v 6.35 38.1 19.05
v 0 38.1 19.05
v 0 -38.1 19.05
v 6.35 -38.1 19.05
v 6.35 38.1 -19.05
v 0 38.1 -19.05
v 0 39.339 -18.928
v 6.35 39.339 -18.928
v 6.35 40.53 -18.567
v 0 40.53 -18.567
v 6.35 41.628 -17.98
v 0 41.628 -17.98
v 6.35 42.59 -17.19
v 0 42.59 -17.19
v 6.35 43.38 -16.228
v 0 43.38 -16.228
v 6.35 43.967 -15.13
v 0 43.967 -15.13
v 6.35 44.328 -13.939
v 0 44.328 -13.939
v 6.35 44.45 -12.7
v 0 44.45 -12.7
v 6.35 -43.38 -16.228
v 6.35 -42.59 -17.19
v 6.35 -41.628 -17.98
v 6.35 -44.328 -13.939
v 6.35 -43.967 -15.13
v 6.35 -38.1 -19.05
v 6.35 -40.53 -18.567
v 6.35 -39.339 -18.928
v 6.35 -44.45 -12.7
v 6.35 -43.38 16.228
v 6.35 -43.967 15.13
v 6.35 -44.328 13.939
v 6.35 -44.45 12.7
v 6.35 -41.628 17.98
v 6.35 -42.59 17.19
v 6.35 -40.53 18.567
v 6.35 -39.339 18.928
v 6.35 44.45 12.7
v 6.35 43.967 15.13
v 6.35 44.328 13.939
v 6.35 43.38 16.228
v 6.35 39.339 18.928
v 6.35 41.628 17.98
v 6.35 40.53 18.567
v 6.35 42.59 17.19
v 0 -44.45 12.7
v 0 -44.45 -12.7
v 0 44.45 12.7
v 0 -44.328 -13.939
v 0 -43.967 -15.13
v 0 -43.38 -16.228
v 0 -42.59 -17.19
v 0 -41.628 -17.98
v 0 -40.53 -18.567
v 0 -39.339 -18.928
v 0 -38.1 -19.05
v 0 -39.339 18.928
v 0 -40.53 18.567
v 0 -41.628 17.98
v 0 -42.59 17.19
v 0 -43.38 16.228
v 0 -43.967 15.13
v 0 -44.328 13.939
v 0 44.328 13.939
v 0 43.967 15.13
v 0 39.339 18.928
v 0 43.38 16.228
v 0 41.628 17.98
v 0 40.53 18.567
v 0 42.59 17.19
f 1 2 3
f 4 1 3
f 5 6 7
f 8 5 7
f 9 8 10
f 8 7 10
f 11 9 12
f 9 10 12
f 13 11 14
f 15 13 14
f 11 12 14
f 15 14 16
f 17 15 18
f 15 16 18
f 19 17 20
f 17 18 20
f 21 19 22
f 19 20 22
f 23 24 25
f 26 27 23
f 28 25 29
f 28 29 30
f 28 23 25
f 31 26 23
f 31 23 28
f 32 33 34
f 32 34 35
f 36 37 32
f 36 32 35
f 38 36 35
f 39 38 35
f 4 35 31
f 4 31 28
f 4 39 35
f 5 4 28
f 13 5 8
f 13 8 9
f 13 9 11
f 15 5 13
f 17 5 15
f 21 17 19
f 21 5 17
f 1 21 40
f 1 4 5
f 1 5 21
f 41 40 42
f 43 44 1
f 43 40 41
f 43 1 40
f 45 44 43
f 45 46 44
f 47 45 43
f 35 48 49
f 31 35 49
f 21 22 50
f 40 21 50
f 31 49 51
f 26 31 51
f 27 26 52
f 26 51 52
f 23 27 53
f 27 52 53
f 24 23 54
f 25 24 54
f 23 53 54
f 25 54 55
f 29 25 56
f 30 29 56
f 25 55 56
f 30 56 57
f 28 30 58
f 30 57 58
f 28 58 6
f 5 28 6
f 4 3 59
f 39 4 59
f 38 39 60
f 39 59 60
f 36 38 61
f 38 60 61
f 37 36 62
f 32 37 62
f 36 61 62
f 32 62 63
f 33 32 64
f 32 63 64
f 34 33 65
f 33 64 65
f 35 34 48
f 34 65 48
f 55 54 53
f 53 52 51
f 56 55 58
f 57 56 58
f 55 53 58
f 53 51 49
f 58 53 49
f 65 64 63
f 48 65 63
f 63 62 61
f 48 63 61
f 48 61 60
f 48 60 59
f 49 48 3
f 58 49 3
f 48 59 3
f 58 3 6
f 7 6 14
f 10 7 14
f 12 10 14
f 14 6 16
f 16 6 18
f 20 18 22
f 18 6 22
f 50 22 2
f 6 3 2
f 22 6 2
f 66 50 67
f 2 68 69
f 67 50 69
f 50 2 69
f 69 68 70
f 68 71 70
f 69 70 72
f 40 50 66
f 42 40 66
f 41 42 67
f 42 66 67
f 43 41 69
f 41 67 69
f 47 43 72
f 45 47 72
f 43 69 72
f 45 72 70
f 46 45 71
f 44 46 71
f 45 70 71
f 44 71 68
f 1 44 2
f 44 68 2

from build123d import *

# Parameters (mm, degrees)
F1_DEPTH = 6.35


with BuildPart() as f1:
    # F0 (on Right) → F1 (new body)
    with BuildSketch(Plane.YZ):
        with BuildLine():
            ThreePointArc((44.45, 12.7), (42.590128, 17.190128), (38.1, 19.05))
            Line((38.1, 19.05), (-38.1, 19.05))
            ThreePointArc((-38.1, 19.05), (-42.590128, 17.190128), (-44.45, 12.7))
            Line((-44.45, 12.7), (-44.45, -12.7))
            ThreePointArc((-44.45, -12.7), (-42.590128, -17.190128), (-38.1, -19.05))
            Line((-38.1, -19.05), (38.1, -19.05))
            ThreePointArc((38.1, -19.05), (42.590128, -17.190128), (44.45, -12.7))
            Line((44.45, -12.7), (44.45, 12.7))
        make_face()
    extrude(amount=F1_DEPTH)


solid = f1.part
